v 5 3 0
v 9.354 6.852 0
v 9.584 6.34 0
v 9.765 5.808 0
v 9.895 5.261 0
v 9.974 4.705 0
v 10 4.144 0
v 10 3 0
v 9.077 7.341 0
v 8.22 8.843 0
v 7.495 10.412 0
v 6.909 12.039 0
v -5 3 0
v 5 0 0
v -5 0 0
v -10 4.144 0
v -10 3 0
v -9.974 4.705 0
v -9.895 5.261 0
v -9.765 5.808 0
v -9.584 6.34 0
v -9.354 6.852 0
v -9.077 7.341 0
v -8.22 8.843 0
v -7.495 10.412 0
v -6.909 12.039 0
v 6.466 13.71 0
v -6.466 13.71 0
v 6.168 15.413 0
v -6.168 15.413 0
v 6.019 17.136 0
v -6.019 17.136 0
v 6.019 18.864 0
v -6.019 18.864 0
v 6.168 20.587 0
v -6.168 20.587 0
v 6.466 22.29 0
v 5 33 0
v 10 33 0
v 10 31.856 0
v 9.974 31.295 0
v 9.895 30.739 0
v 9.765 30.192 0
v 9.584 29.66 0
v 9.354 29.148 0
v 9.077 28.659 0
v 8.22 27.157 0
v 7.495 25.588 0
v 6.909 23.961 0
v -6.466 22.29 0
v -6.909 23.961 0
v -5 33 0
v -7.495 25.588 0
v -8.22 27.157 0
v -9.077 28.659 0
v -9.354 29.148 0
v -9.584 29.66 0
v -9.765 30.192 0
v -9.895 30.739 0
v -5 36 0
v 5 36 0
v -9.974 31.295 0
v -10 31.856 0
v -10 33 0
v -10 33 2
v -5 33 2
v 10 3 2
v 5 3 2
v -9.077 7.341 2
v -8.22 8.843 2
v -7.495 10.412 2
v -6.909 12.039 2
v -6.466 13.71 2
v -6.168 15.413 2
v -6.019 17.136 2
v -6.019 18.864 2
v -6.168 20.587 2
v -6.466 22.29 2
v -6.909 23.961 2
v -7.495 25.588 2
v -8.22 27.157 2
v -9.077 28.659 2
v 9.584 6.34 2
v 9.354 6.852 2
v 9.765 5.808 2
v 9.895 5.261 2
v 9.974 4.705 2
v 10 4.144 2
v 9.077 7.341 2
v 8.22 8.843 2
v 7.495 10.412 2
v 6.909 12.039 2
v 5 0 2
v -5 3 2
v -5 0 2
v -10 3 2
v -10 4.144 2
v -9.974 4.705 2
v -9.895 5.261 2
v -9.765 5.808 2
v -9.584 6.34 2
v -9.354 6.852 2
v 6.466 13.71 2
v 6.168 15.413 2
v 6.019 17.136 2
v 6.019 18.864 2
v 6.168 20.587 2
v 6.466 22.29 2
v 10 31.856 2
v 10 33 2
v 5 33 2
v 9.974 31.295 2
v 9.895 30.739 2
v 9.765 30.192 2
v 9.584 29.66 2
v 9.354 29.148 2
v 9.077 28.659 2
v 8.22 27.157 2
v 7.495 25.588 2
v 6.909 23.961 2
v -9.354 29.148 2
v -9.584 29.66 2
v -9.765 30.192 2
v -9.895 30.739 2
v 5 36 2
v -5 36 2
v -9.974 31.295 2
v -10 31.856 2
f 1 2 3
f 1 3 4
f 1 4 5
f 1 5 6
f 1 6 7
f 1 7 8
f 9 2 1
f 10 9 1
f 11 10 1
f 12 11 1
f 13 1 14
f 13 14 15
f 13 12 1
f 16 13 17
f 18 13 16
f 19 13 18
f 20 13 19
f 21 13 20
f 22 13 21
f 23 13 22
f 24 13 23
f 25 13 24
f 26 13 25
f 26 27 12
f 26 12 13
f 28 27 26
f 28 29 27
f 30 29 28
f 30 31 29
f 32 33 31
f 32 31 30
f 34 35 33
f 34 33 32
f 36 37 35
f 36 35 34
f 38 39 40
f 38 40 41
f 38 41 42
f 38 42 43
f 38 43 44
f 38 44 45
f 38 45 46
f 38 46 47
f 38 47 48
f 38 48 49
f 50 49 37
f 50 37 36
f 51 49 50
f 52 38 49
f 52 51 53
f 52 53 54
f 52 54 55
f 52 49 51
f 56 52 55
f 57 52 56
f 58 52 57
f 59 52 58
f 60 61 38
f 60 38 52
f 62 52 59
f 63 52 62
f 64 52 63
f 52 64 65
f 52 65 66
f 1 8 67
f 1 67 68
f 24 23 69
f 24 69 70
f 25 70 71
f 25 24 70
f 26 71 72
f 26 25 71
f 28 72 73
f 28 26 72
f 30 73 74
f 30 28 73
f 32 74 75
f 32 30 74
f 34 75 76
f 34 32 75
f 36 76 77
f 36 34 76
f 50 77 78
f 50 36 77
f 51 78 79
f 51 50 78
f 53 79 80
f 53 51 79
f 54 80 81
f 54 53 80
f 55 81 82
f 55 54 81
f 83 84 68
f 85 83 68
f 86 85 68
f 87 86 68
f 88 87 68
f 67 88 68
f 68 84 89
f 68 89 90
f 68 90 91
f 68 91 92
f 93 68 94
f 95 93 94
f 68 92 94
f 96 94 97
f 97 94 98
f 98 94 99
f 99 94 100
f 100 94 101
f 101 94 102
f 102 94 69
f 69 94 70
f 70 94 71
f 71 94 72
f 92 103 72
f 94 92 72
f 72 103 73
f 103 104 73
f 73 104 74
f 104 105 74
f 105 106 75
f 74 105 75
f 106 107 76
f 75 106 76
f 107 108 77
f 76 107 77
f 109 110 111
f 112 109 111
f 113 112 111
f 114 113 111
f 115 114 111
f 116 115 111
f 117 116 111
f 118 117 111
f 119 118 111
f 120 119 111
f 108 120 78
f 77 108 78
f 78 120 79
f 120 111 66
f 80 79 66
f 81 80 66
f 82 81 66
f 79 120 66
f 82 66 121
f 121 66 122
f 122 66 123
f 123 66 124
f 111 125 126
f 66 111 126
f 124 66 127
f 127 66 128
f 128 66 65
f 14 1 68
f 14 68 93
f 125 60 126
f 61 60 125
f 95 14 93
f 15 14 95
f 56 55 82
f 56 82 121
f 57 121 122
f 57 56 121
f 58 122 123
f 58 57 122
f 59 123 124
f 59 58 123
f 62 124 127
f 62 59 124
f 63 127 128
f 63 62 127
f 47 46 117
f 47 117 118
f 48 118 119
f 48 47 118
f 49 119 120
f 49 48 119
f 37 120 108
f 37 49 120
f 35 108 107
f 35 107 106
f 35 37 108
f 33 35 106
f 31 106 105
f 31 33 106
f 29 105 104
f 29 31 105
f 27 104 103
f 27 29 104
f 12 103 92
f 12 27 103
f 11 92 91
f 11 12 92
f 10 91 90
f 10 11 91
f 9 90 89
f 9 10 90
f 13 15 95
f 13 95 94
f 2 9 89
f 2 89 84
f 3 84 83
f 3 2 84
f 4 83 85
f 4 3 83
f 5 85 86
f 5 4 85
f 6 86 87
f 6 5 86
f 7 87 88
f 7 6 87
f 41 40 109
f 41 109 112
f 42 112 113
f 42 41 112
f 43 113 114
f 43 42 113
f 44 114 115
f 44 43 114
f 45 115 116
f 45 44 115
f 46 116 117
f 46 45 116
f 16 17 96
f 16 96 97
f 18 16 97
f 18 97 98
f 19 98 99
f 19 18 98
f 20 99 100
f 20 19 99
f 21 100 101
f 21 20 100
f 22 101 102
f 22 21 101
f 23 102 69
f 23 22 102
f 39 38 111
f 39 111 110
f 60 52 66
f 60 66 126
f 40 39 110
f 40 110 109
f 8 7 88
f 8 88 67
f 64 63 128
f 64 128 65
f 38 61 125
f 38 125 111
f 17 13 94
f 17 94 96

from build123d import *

# Parameters (mm, degrees)
EXTRUDE_1_DEPTH = 2


with BuildPart() as part:
    # Model → Бобышка-Вытянуть1 (new body)
    with BuildSketch(Plane.XY):
        with BuildLine():
            Line((-10, 33), (-5, 33))
            Line((-5, 33), (-5, 36))
            Line((-5, 36), (5, 36))
            Line((5, 36), (5, 33))
            Line((5, 33), (10, 33))
            Line((10, 33), (10, 31.856406461))
            ThreePointArc((10, 31.856406461), (9.764613537, 30.192305872), (9.076923077, 28.6587742))
            ThreePointArc((9.076923077, 28.6587742), (6, 18), (9.076923077, 7.3412258))
            ThreePointArc((9.076923077, 7.3412258), (9.764613537, 5.807694128), (10, 4.143593539))
            Line((10, 4.143593539), (10, 3))
            Line((10, 3), (5, 3))
            Line((5, 3), (5, 0))
            Line((5, 0), (-5, 0))
            Line((-5, 0), (-5, 3))
            Line((-5, 3), (-10, 3))
            Line((-10, 3), (-10, 4.143593539))
            ThreePointArc((-10, 4.143593539), (-9.764613537, 5.807694128), (-9.076923077, 7.3412258))
            ThreePointArc((-9.076923077, 7.3412258), (-6.000000001, 18), (-9.076923078, 28.6587742))
            ThreePointArc((-9.076923078, 28.6587742), (-9.764613538, 30.192305872), (-10, 31.856406461))
            Line((-10, 31.856406461), (-10, 33))
        make_face()
    extrude(amount=EXTRUDE_1_DEPTH)


solid = part.part
